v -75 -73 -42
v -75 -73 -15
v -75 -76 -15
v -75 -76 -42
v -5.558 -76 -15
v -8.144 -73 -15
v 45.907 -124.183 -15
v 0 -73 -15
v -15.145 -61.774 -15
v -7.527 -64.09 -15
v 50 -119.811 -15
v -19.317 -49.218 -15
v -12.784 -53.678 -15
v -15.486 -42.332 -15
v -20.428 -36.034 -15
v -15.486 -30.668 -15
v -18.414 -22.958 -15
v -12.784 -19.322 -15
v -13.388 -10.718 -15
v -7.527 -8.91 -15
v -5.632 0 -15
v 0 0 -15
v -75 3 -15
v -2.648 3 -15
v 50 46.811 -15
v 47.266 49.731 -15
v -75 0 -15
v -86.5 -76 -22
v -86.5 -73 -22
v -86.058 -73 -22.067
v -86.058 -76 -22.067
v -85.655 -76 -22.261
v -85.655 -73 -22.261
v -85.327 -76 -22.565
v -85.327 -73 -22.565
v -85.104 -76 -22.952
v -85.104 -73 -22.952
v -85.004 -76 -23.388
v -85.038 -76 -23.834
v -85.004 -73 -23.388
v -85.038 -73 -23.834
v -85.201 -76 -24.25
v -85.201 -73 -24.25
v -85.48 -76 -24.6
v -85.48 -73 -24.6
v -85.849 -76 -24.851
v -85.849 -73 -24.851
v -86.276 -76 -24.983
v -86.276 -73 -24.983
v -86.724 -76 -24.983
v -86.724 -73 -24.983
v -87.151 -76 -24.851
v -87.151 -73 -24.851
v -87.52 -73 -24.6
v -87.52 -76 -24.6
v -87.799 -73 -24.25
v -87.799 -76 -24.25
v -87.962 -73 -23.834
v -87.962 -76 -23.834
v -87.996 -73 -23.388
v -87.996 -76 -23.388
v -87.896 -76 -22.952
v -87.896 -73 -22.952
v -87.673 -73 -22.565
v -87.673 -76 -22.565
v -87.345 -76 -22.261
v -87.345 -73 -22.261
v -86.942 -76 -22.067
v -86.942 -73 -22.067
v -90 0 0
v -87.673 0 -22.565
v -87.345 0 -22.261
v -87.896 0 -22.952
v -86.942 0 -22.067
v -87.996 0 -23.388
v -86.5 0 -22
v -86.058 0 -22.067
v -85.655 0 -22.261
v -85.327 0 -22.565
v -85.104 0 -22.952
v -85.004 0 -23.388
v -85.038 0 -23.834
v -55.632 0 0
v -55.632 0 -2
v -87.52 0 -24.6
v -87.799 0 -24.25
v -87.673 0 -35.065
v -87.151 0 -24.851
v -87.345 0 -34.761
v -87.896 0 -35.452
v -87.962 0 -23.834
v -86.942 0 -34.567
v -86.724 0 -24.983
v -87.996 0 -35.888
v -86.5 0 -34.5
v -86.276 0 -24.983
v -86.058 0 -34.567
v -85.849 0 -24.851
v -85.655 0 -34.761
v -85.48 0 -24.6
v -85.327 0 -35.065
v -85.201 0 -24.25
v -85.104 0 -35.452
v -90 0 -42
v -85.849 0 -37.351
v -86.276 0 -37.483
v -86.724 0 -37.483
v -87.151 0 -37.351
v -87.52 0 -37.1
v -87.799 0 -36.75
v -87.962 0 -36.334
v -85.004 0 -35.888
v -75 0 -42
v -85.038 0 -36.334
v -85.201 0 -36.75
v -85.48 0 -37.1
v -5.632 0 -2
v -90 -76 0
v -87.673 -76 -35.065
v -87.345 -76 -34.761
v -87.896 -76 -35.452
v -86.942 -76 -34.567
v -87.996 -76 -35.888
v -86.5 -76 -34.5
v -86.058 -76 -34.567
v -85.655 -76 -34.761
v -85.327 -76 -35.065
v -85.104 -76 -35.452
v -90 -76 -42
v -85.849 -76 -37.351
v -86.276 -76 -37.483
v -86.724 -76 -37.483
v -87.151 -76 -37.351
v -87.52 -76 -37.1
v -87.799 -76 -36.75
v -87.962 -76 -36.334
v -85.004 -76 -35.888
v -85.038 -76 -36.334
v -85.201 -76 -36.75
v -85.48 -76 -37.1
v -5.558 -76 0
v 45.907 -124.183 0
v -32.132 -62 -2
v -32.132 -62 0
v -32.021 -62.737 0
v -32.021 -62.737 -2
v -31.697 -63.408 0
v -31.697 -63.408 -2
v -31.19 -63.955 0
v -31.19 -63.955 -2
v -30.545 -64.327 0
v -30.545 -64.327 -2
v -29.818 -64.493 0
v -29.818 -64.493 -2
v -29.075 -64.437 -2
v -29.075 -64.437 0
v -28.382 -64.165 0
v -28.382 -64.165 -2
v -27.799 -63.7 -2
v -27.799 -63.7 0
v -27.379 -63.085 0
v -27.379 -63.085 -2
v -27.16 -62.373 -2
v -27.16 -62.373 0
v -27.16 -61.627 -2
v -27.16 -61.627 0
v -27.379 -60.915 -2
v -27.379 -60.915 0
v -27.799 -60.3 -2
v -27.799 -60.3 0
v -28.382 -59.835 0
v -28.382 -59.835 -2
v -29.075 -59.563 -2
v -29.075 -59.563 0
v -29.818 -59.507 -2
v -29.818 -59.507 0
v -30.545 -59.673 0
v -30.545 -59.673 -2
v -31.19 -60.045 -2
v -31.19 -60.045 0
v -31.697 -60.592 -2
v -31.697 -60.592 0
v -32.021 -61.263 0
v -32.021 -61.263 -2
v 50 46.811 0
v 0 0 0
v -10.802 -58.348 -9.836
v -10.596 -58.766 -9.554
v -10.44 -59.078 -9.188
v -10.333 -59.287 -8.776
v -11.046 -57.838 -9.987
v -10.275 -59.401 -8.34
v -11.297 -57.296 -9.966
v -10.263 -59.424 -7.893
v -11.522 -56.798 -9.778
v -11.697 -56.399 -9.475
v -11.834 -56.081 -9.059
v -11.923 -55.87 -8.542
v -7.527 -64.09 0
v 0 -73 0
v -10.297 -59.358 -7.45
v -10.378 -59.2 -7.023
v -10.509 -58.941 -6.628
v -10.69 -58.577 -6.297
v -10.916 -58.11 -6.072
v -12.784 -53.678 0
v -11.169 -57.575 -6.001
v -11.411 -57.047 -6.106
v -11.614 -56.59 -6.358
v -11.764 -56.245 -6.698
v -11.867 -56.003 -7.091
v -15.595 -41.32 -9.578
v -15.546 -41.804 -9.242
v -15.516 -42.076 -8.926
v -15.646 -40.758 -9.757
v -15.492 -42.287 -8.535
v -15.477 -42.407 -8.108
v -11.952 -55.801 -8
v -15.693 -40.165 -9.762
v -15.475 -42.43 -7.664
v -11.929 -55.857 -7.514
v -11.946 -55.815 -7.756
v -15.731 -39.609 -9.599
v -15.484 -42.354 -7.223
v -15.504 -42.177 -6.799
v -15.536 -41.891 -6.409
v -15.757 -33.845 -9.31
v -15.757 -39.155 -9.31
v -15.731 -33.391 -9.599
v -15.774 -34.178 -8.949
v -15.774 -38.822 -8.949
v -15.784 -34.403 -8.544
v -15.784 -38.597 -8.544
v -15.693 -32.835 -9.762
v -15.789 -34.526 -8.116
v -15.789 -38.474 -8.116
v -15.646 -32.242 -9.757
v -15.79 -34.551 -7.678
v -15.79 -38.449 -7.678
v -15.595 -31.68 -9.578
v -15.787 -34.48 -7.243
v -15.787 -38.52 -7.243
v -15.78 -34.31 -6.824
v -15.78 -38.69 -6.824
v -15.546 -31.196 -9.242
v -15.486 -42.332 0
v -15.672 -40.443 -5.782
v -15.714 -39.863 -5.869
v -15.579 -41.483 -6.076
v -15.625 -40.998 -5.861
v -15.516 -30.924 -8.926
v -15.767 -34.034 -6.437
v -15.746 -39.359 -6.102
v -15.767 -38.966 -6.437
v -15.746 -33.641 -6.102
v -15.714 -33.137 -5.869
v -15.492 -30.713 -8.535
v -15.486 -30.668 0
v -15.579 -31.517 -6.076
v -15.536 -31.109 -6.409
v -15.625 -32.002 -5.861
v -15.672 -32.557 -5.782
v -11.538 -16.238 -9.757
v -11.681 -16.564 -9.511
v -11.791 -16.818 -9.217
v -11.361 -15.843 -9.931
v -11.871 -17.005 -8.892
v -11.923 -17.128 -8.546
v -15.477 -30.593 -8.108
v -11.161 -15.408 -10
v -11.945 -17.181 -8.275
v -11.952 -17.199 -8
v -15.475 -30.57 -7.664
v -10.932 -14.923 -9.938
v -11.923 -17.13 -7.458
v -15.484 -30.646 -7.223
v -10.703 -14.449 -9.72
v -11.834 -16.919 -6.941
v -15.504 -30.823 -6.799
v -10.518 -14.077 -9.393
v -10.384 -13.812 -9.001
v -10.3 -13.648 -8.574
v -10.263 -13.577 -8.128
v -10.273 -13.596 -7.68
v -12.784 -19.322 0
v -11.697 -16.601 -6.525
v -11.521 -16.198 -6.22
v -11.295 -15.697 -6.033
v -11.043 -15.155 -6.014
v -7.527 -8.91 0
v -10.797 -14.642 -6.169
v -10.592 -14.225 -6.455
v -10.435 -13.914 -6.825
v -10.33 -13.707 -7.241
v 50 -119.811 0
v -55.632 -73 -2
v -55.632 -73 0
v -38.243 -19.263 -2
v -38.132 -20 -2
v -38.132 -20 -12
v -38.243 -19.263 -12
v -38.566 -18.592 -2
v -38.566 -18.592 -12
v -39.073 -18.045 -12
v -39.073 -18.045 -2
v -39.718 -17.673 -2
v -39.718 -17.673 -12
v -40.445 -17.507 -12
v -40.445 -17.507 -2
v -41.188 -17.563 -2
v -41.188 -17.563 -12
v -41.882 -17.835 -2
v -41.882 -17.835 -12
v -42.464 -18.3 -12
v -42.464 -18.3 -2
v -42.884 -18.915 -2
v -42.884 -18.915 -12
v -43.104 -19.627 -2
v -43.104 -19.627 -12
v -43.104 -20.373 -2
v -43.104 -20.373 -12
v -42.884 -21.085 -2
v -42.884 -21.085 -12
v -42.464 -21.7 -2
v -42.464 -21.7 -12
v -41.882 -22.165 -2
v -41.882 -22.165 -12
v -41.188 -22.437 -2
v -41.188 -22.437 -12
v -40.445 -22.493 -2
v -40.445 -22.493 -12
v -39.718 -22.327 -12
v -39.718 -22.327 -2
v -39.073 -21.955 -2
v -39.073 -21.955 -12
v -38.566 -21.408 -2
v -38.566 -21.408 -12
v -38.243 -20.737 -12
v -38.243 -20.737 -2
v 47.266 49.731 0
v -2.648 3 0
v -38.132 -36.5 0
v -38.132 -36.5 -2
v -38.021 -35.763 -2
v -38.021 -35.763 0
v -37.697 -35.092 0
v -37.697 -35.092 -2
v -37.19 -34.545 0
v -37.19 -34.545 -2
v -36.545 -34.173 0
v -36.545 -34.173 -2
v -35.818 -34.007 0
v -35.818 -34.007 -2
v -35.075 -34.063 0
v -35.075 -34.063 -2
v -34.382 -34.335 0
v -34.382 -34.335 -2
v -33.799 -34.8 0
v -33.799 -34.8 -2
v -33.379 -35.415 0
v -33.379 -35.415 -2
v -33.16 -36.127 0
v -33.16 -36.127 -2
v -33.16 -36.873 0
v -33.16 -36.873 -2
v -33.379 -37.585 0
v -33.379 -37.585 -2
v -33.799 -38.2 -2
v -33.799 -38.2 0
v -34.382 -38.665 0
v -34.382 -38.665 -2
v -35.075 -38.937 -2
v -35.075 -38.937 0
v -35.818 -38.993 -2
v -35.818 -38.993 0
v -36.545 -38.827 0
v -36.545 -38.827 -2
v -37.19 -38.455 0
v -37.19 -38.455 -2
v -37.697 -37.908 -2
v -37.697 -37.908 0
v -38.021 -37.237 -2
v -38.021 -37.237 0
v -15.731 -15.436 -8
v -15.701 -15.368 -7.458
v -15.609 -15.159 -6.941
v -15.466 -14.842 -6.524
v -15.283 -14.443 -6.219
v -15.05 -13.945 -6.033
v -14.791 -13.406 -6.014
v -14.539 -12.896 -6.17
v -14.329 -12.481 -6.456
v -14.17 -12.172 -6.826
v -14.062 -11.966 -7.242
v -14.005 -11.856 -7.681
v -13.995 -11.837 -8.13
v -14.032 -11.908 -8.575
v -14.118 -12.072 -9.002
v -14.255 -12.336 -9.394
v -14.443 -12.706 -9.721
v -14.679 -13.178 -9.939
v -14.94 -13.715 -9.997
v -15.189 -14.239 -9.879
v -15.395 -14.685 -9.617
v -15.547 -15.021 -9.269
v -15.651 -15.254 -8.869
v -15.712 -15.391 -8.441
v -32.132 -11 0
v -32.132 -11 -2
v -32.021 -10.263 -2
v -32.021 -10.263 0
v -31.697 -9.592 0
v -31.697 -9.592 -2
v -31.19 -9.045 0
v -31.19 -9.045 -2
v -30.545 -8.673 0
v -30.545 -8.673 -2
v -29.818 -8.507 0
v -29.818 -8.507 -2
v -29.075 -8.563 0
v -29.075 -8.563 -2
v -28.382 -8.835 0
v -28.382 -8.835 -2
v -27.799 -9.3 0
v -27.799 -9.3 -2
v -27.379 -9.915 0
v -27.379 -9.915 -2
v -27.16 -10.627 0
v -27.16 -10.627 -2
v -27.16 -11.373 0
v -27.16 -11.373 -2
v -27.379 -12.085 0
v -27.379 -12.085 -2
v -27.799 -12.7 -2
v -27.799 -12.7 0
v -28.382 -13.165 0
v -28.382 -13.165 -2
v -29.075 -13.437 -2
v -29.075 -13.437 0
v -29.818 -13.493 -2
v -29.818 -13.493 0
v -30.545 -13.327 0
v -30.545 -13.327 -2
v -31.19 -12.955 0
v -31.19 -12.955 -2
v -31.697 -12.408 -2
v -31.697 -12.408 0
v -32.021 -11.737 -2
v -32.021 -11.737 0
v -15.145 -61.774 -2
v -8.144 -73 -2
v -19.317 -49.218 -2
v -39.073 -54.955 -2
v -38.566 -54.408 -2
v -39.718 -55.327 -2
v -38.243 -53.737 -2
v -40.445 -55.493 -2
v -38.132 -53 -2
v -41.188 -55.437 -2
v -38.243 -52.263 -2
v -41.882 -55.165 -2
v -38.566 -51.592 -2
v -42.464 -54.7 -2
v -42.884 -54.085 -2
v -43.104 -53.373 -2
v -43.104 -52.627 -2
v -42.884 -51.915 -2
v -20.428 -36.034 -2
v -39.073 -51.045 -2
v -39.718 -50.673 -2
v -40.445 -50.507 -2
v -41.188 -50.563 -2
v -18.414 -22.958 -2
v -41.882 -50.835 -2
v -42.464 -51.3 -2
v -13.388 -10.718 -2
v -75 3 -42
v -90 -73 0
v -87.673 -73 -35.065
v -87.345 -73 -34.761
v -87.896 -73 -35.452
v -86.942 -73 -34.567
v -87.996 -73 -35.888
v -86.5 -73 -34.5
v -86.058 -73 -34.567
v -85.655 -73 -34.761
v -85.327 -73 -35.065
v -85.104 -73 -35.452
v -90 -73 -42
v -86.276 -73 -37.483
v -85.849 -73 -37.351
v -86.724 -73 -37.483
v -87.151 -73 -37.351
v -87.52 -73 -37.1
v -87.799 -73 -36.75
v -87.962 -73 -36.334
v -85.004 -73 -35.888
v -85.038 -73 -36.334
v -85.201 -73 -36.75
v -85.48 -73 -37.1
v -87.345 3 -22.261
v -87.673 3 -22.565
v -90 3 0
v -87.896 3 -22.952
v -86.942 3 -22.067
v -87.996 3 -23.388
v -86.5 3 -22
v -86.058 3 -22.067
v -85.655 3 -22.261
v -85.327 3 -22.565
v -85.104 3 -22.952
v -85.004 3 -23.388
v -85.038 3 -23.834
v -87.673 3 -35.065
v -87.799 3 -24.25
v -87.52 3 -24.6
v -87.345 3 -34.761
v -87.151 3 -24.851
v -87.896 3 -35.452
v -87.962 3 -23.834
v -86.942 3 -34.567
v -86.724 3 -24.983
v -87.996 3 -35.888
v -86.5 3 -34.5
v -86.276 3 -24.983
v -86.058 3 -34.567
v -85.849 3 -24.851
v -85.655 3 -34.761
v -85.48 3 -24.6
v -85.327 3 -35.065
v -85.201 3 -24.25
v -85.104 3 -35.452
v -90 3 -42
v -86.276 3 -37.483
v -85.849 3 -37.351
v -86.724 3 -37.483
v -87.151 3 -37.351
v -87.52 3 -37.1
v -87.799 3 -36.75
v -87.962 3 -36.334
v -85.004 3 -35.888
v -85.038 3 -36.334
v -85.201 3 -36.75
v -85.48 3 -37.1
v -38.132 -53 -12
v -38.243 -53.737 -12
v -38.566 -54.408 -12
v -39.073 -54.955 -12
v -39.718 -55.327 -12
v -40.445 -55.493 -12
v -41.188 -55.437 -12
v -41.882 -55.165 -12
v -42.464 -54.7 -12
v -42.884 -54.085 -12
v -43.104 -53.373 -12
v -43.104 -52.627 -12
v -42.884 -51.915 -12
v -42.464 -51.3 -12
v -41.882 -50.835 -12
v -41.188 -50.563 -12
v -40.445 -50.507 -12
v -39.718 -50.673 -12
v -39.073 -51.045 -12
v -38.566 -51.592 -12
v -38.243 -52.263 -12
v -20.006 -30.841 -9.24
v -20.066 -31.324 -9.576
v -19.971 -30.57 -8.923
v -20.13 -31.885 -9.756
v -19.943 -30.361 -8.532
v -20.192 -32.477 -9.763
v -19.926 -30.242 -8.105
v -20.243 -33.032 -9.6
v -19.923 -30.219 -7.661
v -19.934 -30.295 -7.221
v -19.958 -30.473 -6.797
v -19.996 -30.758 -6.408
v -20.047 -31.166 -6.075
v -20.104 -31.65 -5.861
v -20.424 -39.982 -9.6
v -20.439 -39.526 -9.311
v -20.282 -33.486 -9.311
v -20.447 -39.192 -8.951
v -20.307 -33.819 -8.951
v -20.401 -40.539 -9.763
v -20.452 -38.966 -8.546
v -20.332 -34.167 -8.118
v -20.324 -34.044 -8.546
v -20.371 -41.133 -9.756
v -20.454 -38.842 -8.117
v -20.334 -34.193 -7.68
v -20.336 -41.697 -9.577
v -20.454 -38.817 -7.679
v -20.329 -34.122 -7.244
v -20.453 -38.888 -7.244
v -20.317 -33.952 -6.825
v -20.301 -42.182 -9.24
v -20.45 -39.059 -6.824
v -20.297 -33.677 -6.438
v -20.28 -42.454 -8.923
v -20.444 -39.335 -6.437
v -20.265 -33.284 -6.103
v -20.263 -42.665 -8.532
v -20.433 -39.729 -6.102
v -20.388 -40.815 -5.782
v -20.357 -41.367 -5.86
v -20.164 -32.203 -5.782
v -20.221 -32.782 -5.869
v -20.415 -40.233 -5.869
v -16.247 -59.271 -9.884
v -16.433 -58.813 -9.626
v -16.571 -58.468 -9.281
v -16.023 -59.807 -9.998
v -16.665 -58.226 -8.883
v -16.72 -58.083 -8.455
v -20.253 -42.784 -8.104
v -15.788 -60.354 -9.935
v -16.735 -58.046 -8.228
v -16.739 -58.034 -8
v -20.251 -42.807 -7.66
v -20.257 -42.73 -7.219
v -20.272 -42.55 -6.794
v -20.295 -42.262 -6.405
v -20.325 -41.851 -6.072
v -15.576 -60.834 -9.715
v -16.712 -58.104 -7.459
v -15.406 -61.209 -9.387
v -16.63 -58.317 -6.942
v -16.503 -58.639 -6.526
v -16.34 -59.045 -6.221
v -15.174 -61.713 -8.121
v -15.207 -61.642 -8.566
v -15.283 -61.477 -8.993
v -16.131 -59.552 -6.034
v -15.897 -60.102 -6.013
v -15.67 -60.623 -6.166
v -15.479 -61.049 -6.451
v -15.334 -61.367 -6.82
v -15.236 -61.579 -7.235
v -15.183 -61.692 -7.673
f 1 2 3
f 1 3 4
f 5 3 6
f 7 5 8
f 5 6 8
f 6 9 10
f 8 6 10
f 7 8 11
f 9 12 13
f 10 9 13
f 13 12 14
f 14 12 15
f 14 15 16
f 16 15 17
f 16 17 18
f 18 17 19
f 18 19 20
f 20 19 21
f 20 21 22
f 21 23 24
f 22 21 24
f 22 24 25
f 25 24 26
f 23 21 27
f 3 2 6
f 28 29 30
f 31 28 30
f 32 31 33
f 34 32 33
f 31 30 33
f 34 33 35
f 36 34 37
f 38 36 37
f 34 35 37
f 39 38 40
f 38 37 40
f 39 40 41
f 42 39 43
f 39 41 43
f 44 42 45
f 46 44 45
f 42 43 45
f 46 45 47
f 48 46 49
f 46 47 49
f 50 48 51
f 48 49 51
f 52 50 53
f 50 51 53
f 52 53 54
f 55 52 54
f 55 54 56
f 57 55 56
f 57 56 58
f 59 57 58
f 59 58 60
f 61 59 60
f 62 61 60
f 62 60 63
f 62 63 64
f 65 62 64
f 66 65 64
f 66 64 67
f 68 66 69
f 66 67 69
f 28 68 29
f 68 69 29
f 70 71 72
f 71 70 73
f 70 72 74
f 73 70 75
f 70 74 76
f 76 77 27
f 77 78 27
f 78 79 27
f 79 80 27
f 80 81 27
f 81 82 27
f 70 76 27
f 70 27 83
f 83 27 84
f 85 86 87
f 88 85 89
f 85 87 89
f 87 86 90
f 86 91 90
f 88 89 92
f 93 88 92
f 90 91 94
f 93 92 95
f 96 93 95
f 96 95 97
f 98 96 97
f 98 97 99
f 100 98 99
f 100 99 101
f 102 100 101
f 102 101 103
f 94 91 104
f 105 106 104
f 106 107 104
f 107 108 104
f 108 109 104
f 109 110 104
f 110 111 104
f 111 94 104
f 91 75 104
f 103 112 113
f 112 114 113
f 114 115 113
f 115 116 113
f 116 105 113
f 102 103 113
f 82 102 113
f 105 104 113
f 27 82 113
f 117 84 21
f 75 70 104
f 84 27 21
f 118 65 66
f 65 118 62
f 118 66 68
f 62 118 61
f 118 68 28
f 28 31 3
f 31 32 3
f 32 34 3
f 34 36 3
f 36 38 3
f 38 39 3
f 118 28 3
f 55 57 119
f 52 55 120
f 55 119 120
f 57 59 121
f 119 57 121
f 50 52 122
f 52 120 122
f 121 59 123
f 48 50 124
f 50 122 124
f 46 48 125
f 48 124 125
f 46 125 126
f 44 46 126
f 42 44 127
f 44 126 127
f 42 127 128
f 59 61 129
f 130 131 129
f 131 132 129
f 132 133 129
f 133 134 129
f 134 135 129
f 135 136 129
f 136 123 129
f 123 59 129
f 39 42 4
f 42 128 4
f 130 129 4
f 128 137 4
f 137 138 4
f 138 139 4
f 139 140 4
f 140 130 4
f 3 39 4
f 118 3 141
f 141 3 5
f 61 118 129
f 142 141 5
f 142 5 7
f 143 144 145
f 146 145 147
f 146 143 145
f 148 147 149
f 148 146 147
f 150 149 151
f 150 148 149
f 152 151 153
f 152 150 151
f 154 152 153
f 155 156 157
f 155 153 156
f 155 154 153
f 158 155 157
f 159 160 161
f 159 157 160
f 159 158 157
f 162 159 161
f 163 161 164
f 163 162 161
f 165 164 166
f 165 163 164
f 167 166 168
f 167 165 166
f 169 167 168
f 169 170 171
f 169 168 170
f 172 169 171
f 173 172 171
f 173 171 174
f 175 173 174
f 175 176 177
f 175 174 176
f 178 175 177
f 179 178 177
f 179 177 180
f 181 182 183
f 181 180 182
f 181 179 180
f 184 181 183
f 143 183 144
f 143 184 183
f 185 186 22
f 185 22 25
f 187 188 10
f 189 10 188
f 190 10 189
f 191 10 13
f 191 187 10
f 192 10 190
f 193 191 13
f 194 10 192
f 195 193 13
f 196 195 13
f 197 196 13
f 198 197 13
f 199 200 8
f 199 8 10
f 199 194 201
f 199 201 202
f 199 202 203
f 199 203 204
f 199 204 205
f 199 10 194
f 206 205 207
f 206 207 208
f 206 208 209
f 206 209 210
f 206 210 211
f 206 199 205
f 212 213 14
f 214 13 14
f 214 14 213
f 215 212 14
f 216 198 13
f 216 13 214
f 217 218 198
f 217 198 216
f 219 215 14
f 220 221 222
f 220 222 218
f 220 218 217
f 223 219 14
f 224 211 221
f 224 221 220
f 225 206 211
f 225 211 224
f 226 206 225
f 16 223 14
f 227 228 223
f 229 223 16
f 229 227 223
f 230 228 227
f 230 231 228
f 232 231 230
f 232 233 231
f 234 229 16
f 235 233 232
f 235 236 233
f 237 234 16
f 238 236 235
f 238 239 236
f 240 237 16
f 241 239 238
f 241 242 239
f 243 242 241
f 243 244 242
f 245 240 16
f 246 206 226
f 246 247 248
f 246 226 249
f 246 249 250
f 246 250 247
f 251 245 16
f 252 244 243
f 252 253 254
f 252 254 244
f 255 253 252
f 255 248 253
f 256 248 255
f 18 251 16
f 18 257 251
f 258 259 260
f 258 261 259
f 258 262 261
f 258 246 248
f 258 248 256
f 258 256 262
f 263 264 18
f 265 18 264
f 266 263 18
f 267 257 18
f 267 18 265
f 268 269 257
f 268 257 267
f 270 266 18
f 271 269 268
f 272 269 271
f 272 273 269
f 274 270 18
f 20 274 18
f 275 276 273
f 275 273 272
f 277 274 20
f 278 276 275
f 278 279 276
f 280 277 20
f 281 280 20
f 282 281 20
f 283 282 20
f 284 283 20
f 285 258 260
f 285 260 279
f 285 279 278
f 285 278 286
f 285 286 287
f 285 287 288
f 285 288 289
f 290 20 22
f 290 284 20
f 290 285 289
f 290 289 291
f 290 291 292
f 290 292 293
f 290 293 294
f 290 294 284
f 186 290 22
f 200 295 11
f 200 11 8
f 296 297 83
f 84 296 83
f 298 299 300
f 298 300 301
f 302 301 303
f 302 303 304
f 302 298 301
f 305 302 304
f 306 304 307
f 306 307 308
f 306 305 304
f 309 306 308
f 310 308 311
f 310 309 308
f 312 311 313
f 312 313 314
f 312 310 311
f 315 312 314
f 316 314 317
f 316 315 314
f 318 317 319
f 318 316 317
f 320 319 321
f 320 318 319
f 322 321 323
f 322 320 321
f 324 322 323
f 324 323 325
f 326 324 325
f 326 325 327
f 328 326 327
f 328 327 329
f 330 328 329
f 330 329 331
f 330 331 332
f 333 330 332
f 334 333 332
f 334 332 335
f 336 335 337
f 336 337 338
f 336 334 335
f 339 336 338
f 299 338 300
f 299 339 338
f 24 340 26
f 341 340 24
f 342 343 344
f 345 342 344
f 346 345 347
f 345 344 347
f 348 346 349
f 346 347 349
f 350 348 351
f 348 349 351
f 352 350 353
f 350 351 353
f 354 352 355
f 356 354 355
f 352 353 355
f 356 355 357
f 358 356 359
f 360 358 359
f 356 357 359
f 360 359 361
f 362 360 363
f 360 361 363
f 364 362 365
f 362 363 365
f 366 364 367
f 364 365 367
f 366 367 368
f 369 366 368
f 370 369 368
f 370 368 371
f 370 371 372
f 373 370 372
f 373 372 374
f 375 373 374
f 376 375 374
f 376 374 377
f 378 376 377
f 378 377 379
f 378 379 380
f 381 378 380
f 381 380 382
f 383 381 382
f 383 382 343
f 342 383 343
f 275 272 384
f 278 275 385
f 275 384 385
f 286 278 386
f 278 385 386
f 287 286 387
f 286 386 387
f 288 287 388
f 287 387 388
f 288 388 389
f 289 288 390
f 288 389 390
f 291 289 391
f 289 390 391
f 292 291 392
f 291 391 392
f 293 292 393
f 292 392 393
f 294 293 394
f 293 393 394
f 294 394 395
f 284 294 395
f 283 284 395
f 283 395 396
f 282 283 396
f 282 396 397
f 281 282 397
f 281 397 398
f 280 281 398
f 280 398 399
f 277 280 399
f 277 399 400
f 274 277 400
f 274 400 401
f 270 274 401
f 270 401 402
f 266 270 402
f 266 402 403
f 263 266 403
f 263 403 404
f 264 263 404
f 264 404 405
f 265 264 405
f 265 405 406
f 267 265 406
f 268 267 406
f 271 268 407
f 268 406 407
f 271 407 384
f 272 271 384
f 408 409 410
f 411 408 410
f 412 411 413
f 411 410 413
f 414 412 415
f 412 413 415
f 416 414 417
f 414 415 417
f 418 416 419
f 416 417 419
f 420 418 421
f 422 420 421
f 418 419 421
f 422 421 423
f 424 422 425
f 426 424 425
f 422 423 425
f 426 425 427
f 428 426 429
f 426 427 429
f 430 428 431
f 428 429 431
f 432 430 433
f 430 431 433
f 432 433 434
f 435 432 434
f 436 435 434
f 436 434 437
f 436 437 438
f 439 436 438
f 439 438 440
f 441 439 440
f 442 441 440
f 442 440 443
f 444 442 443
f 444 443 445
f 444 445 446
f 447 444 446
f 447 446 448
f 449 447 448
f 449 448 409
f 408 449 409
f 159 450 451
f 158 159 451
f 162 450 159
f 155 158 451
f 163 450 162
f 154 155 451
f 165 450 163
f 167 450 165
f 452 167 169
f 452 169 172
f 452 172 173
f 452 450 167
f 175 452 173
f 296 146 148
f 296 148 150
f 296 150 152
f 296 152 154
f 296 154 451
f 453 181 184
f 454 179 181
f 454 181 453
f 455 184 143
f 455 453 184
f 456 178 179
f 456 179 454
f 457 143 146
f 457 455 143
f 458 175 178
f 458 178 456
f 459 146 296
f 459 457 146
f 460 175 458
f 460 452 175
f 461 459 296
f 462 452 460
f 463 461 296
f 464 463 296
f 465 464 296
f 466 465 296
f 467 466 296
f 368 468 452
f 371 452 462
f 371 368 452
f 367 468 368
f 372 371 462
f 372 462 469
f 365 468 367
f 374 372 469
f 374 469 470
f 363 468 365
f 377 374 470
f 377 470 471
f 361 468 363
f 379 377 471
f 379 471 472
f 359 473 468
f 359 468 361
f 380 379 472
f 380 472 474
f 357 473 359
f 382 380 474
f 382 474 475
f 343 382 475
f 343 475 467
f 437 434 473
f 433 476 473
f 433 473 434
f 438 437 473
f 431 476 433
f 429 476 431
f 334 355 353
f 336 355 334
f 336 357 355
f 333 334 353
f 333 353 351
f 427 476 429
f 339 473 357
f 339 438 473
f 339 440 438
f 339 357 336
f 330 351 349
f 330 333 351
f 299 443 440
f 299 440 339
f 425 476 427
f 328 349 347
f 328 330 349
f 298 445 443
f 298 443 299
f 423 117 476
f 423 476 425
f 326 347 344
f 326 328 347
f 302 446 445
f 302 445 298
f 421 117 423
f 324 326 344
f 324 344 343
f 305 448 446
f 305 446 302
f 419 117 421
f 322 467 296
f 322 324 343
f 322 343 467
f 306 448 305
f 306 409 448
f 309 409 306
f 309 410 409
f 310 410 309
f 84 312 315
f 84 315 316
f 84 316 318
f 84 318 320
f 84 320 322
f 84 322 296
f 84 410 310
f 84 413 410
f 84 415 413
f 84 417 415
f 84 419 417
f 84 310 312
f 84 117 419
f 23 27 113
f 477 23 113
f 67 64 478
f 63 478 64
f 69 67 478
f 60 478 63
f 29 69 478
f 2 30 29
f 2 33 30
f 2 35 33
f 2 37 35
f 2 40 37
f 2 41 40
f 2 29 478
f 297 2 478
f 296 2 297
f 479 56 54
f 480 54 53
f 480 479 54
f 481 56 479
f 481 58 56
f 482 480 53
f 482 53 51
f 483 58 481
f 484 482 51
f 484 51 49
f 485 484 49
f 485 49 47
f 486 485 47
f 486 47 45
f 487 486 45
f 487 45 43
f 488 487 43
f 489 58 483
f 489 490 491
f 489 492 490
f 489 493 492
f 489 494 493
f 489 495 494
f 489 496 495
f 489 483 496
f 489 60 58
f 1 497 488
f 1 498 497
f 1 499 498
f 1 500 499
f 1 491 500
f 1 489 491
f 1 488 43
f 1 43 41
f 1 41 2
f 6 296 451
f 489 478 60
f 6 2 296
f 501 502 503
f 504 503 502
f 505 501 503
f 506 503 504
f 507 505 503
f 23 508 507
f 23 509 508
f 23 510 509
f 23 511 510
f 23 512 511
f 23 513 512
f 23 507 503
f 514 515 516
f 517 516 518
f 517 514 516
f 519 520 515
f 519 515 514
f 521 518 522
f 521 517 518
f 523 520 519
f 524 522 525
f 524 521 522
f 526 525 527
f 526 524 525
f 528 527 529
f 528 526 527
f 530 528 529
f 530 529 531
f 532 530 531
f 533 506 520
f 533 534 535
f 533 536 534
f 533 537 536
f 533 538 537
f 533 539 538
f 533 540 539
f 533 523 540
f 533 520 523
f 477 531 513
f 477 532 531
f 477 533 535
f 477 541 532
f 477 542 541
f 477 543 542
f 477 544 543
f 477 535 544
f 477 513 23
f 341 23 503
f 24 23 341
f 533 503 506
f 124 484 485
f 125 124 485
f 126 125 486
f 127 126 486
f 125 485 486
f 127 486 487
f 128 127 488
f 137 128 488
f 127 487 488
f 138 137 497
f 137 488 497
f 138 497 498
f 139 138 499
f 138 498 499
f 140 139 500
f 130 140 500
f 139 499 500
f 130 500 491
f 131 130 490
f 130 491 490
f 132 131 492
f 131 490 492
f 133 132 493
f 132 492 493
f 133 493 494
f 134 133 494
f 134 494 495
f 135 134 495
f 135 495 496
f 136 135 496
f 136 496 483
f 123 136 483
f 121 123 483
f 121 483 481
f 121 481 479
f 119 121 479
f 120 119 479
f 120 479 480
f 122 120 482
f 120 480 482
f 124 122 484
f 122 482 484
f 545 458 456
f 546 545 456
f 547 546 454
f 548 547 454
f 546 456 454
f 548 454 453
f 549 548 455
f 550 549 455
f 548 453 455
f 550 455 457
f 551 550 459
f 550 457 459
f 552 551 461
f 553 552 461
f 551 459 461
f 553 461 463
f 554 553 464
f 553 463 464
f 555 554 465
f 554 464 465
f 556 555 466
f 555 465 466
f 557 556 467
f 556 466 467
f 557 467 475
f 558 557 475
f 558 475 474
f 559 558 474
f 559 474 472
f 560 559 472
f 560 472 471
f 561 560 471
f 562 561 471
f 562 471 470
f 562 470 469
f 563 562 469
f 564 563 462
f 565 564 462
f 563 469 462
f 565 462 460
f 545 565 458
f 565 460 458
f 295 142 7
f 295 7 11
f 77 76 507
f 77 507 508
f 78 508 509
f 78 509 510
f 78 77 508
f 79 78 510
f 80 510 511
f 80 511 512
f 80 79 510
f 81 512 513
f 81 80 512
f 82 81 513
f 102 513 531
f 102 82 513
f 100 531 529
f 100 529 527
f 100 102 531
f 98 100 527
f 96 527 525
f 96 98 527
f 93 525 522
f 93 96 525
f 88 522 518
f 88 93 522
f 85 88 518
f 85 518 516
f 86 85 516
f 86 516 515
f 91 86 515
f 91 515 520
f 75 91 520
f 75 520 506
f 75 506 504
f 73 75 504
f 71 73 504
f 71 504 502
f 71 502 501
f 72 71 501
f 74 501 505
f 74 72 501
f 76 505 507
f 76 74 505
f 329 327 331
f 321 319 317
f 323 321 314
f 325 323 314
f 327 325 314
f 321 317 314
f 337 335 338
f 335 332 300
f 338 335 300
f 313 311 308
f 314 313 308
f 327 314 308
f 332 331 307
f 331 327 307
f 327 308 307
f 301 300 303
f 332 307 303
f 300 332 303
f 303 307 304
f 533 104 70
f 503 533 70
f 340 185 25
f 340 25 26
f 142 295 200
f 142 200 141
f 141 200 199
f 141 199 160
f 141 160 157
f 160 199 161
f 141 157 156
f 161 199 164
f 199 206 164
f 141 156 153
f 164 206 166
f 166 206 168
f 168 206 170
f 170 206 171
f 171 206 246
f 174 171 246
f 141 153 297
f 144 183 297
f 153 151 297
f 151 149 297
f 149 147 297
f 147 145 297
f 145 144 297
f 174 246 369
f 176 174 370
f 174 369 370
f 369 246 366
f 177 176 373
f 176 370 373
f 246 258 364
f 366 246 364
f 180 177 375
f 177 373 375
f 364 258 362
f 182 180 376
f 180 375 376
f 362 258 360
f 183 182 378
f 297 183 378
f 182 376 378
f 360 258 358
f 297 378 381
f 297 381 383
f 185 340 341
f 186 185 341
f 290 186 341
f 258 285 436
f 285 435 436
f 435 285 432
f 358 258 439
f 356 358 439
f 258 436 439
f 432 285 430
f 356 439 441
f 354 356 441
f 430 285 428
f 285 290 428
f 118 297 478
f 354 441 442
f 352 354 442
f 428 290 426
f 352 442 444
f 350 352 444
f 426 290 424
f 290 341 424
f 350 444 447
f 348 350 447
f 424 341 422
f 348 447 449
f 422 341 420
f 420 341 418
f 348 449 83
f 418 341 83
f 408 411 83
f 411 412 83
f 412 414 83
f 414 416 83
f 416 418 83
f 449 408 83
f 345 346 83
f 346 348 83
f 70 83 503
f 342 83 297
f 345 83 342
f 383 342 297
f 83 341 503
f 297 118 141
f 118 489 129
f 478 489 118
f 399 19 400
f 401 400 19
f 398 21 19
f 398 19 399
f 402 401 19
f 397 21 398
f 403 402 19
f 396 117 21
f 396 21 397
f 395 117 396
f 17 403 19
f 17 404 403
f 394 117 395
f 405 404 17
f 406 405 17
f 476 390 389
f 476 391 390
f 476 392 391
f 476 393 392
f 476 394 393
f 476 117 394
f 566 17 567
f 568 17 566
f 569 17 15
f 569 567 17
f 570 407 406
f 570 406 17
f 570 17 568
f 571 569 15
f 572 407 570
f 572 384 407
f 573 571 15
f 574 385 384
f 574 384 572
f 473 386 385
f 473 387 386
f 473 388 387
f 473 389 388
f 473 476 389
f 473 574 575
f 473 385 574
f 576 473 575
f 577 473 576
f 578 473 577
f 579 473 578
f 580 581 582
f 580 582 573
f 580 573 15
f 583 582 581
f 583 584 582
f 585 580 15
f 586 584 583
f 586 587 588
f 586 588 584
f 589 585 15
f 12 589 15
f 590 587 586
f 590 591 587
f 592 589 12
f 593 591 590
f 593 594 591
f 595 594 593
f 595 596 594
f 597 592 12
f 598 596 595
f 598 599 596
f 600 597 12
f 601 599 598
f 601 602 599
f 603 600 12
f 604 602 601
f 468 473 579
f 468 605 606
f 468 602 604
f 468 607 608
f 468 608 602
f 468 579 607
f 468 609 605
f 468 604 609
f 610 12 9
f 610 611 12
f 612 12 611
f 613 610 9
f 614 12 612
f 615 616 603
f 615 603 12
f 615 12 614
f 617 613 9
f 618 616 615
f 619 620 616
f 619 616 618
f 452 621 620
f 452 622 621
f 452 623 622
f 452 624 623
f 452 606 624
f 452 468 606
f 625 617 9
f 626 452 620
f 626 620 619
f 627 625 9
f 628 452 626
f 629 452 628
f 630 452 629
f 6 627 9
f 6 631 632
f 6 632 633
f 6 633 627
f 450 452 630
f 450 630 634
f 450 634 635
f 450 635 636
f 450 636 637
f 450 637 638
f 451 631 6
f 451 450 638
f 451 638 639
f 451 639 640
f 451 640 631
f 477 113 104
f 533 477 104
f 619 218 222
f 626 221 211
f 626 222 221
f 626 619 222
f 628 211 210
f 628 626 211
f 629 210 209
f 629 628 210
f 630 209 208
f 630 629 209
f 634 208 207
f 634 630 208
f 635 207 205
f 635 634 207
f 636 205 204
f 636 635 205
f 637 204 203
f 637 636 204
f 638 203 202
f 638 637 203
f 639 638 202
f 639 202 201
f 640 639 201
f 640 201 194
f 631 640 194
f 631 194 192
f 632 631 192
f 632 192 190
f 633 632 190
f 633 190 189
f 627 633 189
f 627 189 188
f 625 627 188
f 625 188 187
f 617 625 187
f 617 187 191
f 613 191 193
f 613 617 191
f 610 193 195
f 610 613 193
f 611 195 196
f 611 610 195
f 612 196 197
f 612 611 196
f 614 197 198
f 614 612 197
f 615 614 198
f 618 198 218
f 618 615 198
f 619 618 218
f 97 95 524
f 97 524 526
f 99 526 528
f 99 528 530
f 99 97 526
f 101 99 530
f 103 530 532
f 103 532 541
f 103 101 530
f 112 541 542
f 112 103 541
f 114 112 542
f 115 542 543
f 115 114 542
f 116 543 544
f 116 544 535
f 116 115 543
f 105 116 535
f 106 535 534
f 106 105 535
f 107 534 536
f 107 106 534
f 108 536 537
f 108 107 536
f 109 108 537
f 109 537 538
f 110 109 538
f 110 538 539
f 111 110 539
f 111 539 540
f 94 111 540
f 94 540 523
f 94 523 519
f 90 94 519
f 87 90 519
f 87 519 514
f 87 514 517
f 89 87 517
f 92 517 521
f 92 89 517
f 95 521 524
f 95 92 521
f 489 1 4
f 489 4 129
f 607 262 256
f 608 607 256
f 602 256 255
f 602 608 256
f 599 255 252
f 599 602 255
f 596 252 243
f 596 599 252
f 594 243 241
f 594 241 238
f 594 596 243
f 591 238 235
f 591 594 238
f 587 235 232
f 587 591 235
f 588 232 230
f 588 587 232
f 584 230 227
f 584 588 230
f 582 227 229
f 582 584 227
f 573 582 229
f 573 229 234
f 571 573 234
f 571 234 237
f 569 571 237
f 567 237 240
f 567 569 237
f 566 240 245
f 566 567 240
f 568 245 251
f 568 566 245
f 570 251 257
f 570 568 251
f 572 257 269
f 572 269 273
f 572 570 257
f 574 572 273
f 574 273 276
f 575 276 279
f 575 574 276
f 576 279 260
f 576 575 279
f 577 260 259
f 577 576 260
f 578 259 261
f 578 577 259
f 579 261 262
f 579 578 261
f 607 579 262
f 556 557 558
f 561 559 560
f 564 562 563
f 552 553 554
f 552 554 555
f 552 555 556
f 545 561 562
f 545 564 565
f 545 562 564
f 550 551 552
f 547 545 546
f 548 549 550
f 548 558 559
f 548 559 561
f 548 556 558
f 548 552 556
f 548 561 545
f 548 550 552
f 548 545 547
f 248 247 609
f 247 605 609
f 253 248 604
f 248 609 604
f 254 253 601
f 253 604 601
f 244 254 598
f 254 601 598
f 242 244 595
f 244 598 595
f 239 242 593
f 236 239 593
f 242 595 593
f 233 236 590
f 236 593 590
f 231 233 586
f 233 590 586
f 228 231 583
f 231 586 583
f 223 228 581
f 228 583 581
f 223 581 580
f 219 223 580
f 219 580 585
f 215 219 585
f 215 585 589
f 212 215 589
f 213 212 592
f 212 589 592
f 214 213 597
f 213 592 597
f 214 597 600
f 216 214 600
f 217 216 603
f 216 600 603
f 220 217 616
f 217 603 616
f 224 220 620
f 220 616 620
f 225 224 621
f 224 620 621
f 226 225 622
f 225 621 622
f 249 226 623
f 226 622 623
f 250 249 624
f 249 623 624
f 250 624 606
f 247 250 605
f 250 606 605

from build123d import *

# Parameters (mm, degrees)
SKETCH1_R            = 1.5
BOSS_EXTRUDE1_DEPTH  = 3
BOSS_EXTRUDE2_DEPTH  = 15
BOSS_EXTRUDE4_DEPTH  = 2
CUT_SWEEP1_START     = -39.833089264
CUT_SWEEP1_OUTLINE_R = 2
CUT_SWEEP1_DEPTH     = 5.418212301
SKETCH13_R           = 2
CUT_EXTRUDE1_REACH   = 160.497
SKETCH14_R           = 2.5
SKETCH15_R           = 2.5
BOSS_EXTRUDE5_DEPTH  = 10
SKETCH16_R           = 2.5
CUT_EXTRUDE2_DEPTH   = 10


# Read off the part's stored shape, not the designer's step: Cut-Sweep1
with BuildPart() as part:
    # Sketch1 → Boss-Extrude1 (new body)
    with BuildSketch(Plane(origin=(0, 0, 0), x_dir=(1, 0, 0), z_dir=(0, 1, 0))):
        Polygon((-90, 42), (-90, 0), (0, 0), (0, 15), (-75, 15), (-75, 42), align=None)
        with Locations(Location((-86.5, 36, 0), (0, 0, 270))):
            Circle(SKETCH1_R, mode=Mode.SUBTRACT)
        with Locations(Location((-86.5, 23.5, 0), (0, 0, 270))):
            Circle(SKETCH1_R, mode=Mode.SUBTRACT)
    extrude(amount=BOSS_EXTRUDE1_DEPTH)


with BuildPart() as body_2:
    # Mirror7: mirrored copy
    add(part.part.mirror(Plane.ZX.offset(-36.5)))


with BuildPart() as part_1:
    add(part.part)

    add(body_2.part)  # Boss-Extrude2 merges body 2
    # Sketch3 → Boss-Extrude2 (add)
    with BuildSketch(Plane.XY):
        with BuildLine():
            Line((0, 0), (50, 46.811448287))
            Line((50, 46.811448287), (47.26621142, 49.731448287))
            Line((47.26621142, 49.731448287), (-2.73378858, 2.92))
            ThreePointArc((-2.73378858, 2.92), (-20.424933424, -35.957501235), (-5.557687519, -76))
            Line((-5.557687519, -76), (45.907254912, -124.182969825))
            Line((45.907254912, -124.182969825), (50, -119.811448287))
            Line((50, -119.811448287), (0, -73))
            ThreePointArc((0, -73), (-15.82764275, -36.5), (0, 0))
        make_face()
    extrude(amount=-BOSS_EXTRUDE2_DEPTH)

    # Sketch4 → Boss-Extrude4 (add)
    with BuildSketch(Plane.XY):
        with BuildLine():
            Line((-8.143678765, -73), (-55.631592513, -73))
            Line((-55.631592513, -73), (-55.631592513, 0))
            Line((-55.631592513, 0), (-5.631592513, 0))
            ThreePointArc((-5.631592513, 0), (-20.427620409, -36.034060143), (-8.143678765, -73))
        make_face()
    extrude(amount=-BOSS_EXTRUDE4_DEPTH)

    # Cut-Sweep1 outline → Cut-Sweep1 (cut)
    with BuildSketch(Plane(origin=(0, 0, 0), x_dir=(-0.4226182617406999, 0.9063077870366498, 0), z_dir=(0.9063077870366498, 0.4226182617406999, 0)).offset(CUT_SWEEP1_START)):
        with Locations((-47.522096447, -8)):
            Circle(CUT_SWEEP1_OUTLINE_R)
    cut_sweep1 = extrude(amount=CUT_SWEEP1_DEPTH, mode=Mode.SUBTRACT)

    # Cut-Sweep2: sweep along a path in Sketch12
    with BuildLine(Plane(origin=(0, 0, -8), x_dir=(-1, 0, 0), z_dir=(0, 0, -1))) as cut_sweep2_path:
        Line((-34.17235725, -36.5), (20.427620409, -40.807723062))
    # Sketch13 → Cut-Sweep2 (sweep, cut)
    with BuildSketch(Plane(origin=(34.17235725, -36.5, -8), x_dir=(0, 0, 1), z_dir=(-0.9969021605356864, -0.07865165172633562, 0))):
        with Locations((0.218000658, -0.010354147)):
            Circle(SKETCH13_R)
    cut_sweep2 = sweep(path=cut_sweep2_path.line, mode=Mode.SUBTRACT)

    # Mirror8: Cut-Sweep1, Cut-Sweep2 across plane
    add(cut_sweep1.mirror(Plane.ZX.offset(-36.5)), mode=Mode.SUBTRACT)
    add(cut_sweep2.mirror(Plane.ZX.offset(-36.5)), mode=Mode.SUBTRACT)

    # Sketch14 → Cut-Extrude1 (cut, up to next)
    with BuildSketch(Plane(origin=(0, 0, -2), x_dir=(-1, 0, 0), z_dir=(0, 0, -1)), mode=Mode.PRIVATE) as cut_extrude1_sk1:
        with Locations((35.631592513, -36.5)):
            Circle(SKETCH14_R)
    cut_extrude1_tool1 = extrude(cut_extrude1_sk1.sketch, amount=-CUT_EXTRUDE1_REACH, mode=Mode.PRIVATE) & part_1.part
    add(cut_extrude1_tool1.solids().sort_by_distance((-35.631593, -36.5, -2))[0], mode=Mode.SUBTRACT)

    # Sketch15 → Boss-Extrude5 (add)
    with BuildSketch(Plane(origin=(0, 0, -2), x_dir=(-1, 0, 0), z_dir=(0, 0, -1))):
        with Locations(Location((40.631592513, -53, 0), (0, 0, 180))):
            Circle(SKETCH15_R)
    boss_extrude5 = extrude(amount=BOSS_EXTRUDE5_DEPTH)

    # Mirror9: Boss-Extrude5 across plane
    add(boss_extrude5.mirror(Plane.ZX.offset(-36.5)))

    # Sketch16 → Cut-Extrude2 (cut)
    with BuildSketch(Plane(origin=(0, 0, -2), x_dir=(-1, 0, 0), z_dir=(0, 0, -1))):
        with Locations((29.631592513, -11)):
            Circle(SKETCH16_R)
    cut_extrude2 = extrude(amount=-CUT_EXTRUDE2_DEPTH, mode=Mode.SUBTRACT)

    # Mirror10: Cut-Extrude2 across plane
    add(cut_extrude2.mirror(Plane.ZX.offset(-36.5)), mode=Mode.SUBTRACT)


solid = part_1.part
